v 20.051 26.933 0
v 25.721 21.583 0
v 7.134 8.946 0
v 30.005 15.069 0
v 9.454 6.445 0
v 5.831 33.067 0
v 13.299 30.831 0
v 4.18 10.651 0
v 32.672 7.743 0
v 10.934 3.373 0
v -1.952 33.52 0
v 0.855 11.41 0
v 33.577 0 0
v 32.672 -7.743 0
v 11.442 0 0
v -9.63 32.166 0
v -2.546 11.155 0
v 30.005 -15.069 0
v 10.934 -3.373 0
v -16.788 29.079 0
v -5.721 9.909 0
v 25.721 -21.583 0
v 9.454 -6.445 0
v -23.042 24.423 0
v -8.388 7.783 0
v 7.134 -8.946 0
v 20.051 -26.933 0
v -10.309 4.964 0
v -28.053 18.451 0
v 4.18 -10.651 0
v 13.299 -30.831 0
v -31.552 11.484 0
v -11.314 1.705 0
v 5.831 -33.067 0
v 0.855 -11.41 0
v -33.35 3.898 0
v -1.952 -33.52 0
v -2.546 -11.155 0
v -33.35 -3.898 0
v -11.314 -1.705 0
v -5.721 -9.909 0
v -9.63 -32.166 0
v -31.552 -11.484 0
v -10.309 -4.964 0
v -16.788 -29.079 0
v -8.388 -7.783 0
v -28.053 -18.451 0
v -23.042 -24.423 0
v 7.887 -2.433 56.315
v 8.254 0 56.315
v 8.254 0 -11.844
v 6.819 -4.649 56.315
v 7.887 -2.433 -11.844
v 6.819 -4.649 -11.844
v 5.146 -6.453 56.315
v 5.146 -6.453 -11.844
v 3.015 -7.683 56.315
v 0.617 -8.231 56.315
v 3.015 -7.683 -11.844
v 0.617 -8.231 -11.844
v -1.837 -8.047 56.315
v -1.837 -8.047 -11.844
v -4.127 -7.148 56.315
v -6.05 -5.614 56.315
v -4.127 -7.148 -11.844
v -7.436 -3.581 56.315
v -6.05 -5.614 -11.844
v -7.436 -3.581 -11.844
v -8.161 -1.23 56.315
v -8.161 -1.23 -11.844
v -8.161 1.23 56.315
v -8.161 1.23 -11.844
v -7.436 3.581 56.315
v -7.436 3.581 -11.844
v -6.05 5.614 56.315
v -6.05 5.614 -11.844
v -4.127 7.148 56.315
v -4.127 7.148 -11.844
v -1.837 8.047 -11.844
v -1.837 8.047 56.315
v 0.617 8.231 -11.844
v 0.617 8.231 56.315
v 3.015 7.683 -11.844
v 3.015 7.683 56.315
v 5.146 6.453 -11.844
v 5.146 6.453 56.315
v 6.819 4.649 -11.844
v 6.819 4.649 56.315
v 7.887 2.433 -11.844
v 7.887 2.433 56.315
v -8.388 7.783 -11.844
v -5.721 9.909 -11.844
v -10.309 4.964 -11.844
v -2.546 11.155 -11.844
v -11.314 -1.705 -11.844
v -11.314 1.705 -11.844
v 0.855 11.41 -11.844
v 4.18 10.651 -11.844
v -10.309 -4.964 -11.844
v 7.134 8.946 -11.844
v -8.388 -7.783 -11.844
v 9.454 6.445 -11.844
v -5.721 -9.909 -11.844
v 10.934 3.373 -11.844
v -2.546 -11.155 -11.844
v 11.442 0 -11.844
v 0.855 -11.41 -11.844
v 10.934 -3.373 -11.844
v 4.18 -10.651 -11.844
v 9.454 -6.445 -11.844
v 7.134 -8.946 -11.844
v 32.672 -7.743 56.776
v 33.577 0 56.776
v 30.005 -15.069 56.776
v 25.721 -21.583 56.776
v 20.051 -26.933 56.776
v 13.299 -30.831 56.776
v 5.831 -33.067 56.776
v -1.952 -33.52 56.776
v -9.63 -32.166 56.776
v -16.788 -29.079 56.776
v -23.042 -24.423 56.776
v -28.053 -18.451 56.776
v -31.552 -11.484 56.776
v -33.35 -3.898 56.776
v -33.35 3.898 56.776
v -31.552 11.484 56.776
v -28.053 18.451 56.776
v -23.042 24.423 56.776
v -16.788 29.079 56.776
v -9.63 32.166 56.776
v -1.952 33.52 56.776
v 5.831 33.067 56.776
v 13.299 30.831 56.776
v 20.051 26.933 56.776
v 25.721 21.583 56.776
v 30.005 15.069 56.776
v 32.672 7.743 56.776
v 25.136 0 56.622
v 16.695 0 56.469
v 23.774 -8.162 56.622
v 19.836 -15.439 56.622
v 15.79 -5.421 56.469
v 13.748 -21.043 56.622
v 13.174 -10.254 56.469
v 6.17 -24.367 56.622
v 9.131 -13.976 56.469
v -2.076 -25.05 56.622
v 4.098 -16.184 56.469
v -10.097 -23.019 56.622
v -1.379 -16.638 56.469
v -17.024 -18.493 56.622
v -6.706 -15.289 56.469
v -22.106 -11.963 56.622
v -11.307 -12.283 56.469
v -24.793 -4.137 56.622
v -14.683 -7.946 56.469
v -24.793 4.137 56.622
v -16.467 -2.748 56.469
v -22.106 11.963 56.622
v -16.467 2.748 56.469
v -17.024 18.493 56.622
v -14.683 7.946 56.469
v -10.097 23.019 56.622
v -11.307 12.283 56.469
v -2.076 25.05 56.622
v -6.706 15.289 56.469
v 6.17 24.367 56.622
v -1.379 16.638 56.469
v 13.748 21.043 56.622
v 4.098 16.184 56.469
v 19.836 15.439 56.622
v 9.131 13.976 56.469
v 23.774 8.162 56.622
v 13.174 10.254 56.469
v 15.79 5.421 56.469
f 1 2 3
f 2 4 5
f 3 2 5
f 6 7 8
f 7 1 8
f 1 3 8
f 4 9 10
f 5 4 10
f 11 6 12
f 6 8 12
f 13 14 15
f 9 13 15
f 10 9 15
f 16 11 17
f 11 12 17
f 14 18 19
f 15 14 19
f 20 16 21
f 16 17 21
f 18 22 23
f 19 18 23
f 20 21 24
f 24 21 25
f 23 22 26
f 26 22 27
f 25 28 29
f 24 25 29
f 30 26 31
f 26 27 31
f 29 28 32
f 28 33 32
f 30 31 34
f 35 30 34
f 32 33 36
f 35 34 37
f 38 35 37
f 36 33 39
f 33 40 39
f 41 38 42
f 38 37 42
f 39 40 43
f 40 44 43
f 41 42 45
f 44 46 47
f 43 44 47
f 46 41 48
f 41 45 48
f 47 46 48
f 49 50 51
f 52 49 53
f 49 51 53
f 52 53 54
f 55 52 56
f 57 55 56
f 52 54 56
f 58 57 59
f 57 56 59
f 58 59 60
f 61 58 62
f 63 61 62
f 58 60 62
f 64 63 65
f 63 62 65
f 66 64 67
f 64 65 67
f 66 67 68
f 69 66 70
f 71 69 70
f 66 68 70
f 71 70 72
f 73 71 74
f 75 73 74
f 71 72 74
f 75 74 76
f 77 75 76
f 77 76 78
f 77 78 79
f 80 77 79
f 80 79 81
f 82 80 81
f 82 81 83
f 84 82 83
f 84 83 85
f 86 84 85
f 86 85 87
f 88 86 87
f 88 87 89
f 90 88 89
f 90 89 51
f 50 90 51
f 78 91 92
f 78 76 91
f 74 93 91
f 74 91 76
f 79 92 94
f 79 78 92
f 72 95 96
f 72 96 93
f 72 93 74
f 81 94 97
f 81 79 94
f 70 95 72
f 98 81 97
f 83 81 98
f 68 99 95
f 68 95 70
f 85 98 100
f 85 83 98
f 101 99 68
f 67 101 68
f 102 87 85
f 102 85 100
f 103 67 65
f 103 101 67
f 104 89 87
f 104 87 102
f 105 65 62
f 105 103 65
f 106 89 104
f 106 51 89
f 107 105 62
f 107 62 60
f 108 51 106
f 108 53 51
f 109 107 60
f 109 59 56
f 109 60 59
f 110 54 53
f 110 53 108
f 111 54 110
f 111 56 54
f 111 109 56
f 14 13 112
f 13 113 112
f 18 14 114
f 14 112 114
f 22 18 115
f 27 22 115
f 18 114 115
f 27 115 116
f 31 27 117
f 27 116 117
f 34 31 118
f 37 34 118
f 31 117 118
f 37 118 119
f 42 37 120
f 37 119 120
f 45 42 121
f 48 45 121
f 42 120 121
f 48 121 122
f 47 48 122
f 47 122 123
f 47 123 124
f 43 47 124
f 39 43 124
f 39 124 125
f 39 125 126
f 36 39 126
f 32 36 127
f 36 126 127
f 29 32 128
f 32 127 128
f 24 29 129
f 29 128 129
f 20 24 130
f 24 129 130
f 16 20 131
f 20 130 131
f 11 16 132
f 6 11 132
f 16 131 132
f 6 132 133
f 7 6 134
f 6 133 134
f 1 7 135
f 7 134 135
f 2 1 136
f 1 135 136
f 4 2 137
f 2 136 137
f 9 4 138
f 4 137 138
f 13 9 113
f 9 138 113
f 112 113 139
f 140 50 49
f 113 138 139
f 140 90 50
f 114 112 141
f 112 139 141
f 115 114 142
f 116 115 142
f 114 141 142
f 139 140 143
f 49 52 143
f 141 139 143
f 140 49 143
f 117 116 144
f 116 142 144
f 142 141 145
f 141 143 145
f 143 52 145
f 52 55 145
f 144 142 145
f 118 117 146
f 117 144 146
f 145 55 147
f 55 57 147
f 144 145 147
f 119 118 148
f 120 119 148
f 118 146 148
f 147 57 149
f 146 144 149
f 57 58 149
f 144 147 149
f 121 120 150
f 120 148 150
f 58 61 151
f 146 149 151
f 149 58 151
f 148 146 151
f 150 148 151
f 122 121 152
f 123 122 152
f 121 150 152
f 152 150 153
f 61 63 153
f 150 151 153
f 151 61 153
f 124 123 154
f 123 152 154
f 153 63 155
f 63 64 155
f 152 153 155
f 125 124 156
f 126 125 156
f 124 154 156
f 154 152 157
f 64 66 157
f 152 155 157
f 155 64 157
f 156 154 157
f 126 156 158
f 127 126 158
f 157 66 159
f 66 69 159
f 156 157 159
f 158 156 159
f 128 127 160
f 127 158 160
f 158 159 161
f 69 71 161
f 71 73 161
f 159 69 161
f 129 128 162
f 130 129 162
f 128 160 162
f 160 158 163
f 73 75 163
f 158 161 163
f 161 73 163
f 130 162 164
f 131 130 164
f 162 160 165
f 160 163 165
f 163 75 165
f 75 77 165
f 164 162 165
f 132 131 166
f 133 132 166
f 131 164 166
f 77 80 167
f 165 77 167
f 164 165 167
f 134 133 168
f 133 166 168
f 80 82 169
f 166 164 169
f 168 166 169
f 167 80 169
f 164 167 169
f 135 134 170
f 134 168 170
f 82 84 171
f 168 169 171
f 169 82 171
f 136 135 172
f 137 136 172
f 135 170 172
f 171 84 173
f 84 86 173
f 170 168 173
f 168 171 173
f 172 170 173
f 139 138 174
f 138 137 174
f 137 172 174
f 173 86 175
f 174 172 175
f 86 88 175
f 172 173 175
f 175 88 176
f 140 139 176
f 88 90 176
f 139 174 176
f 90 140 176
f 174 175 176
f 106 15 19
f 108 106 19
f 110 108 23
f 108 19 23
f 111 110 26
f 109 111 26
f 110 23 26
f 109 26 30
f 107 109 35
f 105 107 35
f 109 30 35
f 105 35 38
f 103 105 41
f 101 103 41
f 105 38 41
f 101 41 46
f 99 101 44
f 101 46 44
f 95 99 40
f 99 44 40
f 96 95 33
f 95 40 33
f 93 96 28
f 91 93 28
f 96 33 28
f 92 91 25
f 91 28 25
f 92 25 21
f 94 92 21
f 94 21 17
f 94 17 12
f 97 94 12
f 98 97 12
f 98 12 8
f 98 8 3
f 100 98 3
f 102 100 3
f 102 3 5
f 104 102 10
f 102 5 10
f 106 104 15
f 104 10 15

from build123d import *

# Parameters (mm, degrees)
F2_R     = 11.441982
F3_DEPTH = 11.844136
F4_R     = 8.253592
F5_DEPTH = 104.953468


with BuildPart() as f1:
    # F0 (on Front) → F1 (revolve)
    with BuildSketch(Plane.XZ):
        Polygon((33.57698, 56.775637), (0, 56.165144), (0, 0), (33.57698, 0), align=None)
    revolve(axis=Axis((0, 0, 28.082572), (0, 0, -1)))

    # F2 (on face) → F3 (join)
    with BuildSketch(Plane(origin=(0, 0, 0), x_dir=(1, 0, 0), z_dir=(0, 0, -1))):
        Circle(F2_R)
    extrude(amount=F3_DEPTH)

    # F4 (on face) → F5 (cut)
    with BuildSketch(Plane(origin=(0, 0, -11.844136), x_dir=(1, 0, 0), z_dir=(0, 0, -1))):
        Circle(F4_R)
    extrude(amount=-F5_DEPTH, mode=Mode.SUBTRACT)


solid = f1.part
